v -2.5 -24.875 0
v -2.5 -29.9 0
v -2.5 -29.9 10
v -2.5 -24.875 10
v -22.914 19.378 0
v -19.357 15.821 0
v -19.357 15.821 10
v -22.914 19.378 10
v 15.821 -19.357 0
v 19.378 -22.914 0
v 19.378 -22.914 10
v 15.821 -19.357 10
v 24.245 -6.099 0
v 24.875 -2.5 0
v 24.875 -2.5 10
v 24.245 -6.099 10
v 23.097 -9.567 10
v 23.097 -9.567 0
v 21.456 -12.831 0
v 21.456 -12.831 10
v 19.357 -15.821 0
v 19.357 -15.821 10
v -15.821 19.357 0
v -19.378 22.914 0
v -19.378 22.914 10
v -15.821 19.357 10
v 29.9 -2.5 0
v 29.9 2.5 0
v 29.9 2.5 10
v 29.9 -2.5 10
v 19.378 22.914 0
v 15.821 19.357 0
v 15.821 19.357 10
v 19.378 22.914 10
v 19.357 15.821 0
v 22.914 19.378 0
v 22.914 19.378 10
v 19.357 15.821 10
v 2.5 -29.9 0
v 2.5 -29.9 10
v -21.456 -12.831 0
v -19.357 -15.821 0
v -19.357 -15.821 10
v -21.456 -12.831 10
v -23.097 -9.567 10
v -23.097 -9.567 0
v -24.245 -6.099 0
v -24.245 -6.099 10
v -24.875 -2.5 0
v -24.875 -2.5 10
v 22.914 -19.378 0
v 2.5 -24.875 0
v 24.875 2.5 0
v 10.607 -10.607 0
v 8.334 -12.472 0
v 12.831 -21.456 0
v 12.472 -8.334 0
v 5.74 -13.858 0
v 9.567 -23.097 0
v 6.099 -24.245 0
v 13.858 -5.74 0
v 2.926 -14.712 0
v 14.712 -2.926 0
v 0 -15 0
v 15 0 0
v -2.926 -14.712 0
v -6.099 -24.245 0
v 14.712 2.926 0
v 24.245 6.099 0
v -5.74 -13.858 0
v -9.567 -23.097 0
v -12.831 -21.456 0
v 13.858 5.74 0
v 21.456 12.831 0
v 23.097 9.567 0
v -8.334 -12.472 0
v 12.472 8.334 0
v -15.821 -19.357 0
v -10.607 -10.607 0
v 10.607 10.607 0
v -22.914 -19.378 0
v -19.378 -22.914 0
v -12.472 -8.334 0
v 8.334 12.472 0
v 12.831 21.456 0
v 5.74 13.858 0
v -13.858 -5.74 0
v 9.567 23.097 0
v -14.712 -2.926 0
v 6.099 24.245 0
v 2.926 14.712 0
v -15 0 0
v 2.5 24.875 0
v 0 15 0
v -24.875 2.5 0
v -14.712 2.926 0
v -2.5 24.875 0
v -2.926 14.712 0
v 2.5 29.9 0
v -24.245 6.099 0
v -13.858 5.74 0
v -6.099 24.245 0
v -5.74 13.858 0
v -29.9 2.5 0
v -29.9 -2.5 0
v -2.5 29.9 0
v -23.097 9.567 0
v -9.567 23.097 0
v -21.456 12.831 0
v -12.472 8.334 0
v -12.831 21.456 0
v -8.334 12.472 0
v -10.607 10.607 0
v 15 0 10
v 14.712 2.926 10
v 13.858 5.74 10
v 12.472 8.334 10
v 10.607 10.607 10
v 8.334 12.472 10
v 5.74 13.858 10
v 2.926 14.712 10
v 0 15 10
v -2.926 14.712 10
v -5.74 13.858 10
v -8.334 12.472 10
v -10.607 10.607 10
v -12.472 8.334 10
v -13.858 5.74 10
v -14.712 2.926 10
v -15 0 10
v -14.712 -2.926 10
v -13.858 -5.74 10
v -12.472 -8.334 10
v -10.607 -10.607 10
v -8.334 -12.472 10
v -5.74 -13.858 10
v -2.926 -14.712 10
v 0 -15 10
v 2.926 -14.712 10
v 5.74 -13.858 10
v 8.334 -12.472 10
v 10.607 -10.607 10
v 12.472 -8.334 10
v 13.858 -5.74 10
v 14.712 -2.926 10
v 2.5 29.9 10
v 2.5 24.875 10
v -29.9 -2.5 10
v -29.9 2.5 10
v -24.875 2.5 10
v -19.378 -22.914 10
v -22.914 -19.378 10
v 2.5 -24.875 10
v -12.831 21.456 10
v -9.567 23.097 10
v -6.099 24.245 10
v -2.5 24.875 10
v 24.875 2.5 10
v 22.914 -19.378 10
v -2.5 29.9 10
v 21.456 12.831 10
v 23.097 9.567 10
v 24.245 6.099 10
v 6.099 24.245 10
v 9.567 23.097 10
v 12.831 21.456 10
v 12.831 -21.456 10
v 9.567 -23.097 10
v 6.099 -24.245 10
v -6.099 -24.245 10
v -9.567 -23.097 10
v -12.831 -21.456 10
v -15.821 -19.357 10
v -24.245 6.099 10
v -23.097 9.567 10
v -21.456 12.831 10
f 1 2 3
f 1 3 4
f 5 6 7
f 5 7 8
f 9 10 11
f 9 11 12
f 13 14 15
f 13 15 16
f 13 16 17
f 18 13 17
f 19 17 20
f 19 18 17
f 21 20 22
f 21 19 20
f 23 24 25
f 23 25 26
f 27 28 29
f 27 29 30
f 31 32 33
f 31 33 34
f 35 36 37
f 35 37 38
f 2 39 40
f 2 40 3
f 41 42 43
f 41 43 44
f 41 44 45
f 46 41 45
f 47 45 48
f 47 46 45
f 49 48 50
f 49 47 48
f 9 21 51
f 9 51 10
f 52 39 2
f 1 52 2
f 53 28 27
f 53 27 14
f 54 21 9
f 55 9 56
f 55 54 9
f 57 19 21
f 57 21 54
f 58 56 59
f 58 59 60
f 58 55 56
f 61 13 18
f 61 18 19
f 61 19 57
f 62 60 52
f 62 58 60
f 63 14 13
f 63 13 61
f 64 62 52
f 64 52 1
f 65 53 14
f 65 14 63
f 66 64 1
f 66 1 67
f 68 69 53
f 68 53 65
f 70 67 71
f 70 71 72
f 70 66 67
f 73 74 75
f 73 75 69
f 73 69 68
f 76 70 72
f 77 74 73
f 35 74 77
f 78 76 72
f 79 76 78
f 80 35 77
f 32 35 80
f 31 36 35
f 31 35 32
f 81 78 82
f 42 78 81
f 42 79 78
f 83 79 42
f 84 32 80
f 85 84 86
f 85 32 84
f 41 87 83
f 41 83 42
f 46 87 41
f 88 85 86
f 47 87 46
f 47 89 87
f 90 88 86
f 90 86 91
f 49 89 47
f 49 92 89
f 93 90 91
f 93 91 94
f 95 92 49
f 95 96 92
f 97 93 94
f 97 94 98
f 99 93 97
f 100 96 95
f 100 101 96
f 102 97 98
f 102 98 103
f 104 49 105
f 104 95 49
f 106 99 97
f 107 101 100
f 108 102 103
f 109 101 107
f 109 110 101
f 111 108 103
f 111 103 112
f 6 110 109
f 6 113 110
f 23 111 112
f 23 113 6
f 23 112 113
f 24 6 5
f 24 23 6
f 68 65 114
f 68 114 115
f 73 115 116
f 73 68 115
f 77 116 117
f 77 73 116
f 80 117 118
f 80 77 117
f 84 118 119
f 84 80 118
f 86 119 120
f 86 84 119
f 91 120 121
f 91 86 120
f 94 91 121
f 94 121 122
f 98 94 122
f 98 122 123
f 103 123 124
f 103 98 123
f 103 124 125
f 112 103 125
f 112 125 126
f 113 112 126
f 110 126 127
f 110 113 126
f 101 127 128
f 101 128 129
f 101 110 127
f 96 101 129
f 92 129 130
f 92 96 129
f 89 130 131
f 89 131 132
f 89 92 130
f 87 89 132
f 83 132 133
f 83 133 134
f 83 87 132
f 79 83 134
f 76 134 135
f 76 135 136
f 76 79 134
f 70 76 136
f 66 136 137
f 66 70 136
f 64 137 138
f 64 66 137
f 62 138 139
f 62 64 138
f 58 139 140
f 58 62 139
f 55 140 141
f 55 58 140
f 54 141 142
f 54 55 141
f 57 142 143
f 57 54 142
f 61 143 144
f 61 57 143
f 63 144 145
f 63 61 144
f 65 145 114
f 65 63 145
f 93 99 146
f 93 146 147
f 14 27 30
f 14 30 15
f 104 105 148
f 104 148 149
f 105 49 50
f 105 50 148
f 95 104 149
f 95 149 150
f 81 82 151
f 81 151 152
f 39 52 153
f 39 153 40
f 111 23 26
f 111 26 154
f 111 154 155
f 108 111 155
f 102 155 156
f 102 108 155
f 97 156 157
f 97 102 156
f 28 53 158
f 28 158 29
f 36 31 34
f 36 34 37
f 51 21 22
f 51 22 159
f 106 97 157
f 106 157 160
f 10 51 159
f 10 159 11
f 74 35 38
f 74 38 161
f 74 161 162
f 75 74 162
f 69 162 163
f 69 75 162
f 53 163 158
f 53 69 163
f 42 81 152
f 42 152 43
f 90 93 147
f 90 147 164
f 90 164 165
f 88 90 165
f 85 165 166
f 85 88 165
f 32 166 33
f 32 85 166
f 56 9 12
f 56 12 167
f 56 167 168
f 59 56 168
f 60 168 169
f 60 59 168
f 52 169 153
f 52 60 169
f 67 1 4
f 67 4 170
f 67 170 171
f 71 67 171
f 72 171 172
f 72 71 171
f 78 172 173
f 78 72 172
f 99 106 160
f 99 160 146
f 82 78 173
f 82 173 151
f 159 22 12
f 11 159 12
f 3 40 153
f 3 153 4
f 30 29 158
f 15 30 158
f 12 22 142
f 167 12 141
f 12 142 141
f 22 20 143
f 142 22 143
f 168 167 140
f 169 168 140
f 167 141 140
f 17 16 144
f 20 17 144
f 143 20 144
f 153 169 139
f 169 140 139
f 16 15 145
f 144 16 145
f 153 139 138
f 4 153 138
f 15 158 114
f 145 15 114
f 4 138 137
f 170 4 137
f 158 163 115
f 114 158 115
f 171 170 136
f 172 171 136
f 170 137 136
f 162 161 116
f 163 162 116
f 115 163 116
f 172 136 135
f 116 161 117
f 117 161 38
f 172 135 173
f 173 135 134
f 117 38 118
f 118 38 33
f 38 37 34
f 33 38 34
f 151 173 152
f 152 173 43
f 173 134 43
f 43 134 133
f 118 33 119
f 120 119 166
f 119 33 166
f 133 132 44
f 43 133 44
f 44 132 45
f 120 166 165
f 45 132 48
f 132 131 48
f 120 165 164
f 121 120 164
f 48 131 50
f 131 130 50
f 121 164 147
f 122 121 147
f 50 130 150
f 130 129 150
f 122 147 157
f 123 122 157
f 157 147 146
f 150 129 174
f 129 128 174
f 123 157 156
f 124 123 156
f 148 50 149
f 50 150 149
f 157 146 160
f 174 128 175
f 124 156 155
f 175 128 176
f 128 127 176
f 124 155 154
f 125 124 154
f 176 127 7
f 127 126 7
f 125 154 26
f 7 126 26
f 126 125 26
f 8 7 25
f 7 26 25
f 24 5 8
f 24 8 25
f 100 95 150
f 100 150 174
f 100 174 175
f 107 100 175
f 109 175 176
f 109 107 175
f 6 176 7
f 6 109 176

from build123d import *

# Parameters (mm, degrees)
SKETCH1_R           = 15
BOSS_EXTRUDE1_DEPTH = 10


with BuildPart() as part:
    # Sketch1 → Boss-Extrude1 (new body)
    with BuildSketch(Plane.XY):
        with BuildLine():
            Line((22.913573162, 19.378039256), (19.356826052, 15.821292146))
            ThreePointArc((19.356826052, 15.821292146), (23.096988313, 9.567085809), (24.874685928, 2.5))
            Line((24.874685928, 2.5), (29.9, 2.5))
            Line((29.9, 2.5), (29.9, -2.5))
            Line((29.9, -2.5), (24.874685928, -2.5))
            ThreePointArc((24.874685928, -2.5), (23.096988313, -9.567085809), (19.356826052, -15.821292146))
            Line((19.356826052, -15.821292146), (22.913573162, -19.378039256))
            Line((22.913573162, -19.378039256), (19.378039256, -22.913573162))
            Line((19.378039256, -22.913573162), (15.821292146, -19.356826052))
            ThreePointArc((15.821292146, -19.356826052), (9.567085809, -23.096988313), (2.5, -24.874685928))
            Line((2.5, -24.874685928), (2.5, -29.9))
            Line((2.5, -29.9), (-2.5, -29.9))
            Line((-2.5, -29.9), (-2.5, -24.874685928))
            ThreePointArc((-2.5, -24.874685928), (-9.567085809, -23.096988313), (-15.821292146, -19.356826052))
            Line((-15.821292146, -19.356826052), (-19.378039256, -22.913573162))
            Line((-19.378039256, -22.913573162), (-22.913573162, -19.378039256))
            Line((-22.913573162, -19.378039256), (-19.356826052, -15.821292146))
            ThreePointArc((-19.356826052, -15.821292146), (-23.096988313, -9.567085809), (-24.874685928, -2.5))
            Line((-24.874685928, -2.5), (-29.9, -2.5))
            Line((-29.9, -2.5), (-29.9, 2.5))
            Line((-29.9, 2.5), (-24.874685928, 2.5))
            ThreePointArc((-24.874685928, 2.5), (-23.096988313, 9.567085809), (-19.356826052, 15.821292146))
            Line((-19.356826052, 15.821292146), (-22.913573162, 19.378039256))
            Line((-22.913573162, 19.378039256), (-19.378039256, 22.913573162))
            Line((-19.378039256, 22.913573162), (-15.821292146, 19.356826052))
            ThreePointArc((-15.821292146, 19.356826052), (-9.567085809, 23.096988313), (-2.5, 24.874685928))
            Line((-2.5, 24.874685928), (-2.5, 29.9))
            Line((-2.5, 29.9), (2.5, 29.9))
            Line((2.5, 29.9), (2.5, 24.874685928))
            ThreePointArc((2.5, 24.874685928), (9.567085809, 23.096988313), (15.821292146, 19.356826052))
            Line((15.821292146, 19.356826052), (19.378039256, 22.913573162))
            Line((19.378039256, 22.913573162), (22.913573162, 19.378039256))
        make_face()
        Circle(SKETCH1_R, mode=Mode.SUBTRACT)
    extrude(amount=BOSS_EXTRUDE1_DEPTH)


solid = part.part
